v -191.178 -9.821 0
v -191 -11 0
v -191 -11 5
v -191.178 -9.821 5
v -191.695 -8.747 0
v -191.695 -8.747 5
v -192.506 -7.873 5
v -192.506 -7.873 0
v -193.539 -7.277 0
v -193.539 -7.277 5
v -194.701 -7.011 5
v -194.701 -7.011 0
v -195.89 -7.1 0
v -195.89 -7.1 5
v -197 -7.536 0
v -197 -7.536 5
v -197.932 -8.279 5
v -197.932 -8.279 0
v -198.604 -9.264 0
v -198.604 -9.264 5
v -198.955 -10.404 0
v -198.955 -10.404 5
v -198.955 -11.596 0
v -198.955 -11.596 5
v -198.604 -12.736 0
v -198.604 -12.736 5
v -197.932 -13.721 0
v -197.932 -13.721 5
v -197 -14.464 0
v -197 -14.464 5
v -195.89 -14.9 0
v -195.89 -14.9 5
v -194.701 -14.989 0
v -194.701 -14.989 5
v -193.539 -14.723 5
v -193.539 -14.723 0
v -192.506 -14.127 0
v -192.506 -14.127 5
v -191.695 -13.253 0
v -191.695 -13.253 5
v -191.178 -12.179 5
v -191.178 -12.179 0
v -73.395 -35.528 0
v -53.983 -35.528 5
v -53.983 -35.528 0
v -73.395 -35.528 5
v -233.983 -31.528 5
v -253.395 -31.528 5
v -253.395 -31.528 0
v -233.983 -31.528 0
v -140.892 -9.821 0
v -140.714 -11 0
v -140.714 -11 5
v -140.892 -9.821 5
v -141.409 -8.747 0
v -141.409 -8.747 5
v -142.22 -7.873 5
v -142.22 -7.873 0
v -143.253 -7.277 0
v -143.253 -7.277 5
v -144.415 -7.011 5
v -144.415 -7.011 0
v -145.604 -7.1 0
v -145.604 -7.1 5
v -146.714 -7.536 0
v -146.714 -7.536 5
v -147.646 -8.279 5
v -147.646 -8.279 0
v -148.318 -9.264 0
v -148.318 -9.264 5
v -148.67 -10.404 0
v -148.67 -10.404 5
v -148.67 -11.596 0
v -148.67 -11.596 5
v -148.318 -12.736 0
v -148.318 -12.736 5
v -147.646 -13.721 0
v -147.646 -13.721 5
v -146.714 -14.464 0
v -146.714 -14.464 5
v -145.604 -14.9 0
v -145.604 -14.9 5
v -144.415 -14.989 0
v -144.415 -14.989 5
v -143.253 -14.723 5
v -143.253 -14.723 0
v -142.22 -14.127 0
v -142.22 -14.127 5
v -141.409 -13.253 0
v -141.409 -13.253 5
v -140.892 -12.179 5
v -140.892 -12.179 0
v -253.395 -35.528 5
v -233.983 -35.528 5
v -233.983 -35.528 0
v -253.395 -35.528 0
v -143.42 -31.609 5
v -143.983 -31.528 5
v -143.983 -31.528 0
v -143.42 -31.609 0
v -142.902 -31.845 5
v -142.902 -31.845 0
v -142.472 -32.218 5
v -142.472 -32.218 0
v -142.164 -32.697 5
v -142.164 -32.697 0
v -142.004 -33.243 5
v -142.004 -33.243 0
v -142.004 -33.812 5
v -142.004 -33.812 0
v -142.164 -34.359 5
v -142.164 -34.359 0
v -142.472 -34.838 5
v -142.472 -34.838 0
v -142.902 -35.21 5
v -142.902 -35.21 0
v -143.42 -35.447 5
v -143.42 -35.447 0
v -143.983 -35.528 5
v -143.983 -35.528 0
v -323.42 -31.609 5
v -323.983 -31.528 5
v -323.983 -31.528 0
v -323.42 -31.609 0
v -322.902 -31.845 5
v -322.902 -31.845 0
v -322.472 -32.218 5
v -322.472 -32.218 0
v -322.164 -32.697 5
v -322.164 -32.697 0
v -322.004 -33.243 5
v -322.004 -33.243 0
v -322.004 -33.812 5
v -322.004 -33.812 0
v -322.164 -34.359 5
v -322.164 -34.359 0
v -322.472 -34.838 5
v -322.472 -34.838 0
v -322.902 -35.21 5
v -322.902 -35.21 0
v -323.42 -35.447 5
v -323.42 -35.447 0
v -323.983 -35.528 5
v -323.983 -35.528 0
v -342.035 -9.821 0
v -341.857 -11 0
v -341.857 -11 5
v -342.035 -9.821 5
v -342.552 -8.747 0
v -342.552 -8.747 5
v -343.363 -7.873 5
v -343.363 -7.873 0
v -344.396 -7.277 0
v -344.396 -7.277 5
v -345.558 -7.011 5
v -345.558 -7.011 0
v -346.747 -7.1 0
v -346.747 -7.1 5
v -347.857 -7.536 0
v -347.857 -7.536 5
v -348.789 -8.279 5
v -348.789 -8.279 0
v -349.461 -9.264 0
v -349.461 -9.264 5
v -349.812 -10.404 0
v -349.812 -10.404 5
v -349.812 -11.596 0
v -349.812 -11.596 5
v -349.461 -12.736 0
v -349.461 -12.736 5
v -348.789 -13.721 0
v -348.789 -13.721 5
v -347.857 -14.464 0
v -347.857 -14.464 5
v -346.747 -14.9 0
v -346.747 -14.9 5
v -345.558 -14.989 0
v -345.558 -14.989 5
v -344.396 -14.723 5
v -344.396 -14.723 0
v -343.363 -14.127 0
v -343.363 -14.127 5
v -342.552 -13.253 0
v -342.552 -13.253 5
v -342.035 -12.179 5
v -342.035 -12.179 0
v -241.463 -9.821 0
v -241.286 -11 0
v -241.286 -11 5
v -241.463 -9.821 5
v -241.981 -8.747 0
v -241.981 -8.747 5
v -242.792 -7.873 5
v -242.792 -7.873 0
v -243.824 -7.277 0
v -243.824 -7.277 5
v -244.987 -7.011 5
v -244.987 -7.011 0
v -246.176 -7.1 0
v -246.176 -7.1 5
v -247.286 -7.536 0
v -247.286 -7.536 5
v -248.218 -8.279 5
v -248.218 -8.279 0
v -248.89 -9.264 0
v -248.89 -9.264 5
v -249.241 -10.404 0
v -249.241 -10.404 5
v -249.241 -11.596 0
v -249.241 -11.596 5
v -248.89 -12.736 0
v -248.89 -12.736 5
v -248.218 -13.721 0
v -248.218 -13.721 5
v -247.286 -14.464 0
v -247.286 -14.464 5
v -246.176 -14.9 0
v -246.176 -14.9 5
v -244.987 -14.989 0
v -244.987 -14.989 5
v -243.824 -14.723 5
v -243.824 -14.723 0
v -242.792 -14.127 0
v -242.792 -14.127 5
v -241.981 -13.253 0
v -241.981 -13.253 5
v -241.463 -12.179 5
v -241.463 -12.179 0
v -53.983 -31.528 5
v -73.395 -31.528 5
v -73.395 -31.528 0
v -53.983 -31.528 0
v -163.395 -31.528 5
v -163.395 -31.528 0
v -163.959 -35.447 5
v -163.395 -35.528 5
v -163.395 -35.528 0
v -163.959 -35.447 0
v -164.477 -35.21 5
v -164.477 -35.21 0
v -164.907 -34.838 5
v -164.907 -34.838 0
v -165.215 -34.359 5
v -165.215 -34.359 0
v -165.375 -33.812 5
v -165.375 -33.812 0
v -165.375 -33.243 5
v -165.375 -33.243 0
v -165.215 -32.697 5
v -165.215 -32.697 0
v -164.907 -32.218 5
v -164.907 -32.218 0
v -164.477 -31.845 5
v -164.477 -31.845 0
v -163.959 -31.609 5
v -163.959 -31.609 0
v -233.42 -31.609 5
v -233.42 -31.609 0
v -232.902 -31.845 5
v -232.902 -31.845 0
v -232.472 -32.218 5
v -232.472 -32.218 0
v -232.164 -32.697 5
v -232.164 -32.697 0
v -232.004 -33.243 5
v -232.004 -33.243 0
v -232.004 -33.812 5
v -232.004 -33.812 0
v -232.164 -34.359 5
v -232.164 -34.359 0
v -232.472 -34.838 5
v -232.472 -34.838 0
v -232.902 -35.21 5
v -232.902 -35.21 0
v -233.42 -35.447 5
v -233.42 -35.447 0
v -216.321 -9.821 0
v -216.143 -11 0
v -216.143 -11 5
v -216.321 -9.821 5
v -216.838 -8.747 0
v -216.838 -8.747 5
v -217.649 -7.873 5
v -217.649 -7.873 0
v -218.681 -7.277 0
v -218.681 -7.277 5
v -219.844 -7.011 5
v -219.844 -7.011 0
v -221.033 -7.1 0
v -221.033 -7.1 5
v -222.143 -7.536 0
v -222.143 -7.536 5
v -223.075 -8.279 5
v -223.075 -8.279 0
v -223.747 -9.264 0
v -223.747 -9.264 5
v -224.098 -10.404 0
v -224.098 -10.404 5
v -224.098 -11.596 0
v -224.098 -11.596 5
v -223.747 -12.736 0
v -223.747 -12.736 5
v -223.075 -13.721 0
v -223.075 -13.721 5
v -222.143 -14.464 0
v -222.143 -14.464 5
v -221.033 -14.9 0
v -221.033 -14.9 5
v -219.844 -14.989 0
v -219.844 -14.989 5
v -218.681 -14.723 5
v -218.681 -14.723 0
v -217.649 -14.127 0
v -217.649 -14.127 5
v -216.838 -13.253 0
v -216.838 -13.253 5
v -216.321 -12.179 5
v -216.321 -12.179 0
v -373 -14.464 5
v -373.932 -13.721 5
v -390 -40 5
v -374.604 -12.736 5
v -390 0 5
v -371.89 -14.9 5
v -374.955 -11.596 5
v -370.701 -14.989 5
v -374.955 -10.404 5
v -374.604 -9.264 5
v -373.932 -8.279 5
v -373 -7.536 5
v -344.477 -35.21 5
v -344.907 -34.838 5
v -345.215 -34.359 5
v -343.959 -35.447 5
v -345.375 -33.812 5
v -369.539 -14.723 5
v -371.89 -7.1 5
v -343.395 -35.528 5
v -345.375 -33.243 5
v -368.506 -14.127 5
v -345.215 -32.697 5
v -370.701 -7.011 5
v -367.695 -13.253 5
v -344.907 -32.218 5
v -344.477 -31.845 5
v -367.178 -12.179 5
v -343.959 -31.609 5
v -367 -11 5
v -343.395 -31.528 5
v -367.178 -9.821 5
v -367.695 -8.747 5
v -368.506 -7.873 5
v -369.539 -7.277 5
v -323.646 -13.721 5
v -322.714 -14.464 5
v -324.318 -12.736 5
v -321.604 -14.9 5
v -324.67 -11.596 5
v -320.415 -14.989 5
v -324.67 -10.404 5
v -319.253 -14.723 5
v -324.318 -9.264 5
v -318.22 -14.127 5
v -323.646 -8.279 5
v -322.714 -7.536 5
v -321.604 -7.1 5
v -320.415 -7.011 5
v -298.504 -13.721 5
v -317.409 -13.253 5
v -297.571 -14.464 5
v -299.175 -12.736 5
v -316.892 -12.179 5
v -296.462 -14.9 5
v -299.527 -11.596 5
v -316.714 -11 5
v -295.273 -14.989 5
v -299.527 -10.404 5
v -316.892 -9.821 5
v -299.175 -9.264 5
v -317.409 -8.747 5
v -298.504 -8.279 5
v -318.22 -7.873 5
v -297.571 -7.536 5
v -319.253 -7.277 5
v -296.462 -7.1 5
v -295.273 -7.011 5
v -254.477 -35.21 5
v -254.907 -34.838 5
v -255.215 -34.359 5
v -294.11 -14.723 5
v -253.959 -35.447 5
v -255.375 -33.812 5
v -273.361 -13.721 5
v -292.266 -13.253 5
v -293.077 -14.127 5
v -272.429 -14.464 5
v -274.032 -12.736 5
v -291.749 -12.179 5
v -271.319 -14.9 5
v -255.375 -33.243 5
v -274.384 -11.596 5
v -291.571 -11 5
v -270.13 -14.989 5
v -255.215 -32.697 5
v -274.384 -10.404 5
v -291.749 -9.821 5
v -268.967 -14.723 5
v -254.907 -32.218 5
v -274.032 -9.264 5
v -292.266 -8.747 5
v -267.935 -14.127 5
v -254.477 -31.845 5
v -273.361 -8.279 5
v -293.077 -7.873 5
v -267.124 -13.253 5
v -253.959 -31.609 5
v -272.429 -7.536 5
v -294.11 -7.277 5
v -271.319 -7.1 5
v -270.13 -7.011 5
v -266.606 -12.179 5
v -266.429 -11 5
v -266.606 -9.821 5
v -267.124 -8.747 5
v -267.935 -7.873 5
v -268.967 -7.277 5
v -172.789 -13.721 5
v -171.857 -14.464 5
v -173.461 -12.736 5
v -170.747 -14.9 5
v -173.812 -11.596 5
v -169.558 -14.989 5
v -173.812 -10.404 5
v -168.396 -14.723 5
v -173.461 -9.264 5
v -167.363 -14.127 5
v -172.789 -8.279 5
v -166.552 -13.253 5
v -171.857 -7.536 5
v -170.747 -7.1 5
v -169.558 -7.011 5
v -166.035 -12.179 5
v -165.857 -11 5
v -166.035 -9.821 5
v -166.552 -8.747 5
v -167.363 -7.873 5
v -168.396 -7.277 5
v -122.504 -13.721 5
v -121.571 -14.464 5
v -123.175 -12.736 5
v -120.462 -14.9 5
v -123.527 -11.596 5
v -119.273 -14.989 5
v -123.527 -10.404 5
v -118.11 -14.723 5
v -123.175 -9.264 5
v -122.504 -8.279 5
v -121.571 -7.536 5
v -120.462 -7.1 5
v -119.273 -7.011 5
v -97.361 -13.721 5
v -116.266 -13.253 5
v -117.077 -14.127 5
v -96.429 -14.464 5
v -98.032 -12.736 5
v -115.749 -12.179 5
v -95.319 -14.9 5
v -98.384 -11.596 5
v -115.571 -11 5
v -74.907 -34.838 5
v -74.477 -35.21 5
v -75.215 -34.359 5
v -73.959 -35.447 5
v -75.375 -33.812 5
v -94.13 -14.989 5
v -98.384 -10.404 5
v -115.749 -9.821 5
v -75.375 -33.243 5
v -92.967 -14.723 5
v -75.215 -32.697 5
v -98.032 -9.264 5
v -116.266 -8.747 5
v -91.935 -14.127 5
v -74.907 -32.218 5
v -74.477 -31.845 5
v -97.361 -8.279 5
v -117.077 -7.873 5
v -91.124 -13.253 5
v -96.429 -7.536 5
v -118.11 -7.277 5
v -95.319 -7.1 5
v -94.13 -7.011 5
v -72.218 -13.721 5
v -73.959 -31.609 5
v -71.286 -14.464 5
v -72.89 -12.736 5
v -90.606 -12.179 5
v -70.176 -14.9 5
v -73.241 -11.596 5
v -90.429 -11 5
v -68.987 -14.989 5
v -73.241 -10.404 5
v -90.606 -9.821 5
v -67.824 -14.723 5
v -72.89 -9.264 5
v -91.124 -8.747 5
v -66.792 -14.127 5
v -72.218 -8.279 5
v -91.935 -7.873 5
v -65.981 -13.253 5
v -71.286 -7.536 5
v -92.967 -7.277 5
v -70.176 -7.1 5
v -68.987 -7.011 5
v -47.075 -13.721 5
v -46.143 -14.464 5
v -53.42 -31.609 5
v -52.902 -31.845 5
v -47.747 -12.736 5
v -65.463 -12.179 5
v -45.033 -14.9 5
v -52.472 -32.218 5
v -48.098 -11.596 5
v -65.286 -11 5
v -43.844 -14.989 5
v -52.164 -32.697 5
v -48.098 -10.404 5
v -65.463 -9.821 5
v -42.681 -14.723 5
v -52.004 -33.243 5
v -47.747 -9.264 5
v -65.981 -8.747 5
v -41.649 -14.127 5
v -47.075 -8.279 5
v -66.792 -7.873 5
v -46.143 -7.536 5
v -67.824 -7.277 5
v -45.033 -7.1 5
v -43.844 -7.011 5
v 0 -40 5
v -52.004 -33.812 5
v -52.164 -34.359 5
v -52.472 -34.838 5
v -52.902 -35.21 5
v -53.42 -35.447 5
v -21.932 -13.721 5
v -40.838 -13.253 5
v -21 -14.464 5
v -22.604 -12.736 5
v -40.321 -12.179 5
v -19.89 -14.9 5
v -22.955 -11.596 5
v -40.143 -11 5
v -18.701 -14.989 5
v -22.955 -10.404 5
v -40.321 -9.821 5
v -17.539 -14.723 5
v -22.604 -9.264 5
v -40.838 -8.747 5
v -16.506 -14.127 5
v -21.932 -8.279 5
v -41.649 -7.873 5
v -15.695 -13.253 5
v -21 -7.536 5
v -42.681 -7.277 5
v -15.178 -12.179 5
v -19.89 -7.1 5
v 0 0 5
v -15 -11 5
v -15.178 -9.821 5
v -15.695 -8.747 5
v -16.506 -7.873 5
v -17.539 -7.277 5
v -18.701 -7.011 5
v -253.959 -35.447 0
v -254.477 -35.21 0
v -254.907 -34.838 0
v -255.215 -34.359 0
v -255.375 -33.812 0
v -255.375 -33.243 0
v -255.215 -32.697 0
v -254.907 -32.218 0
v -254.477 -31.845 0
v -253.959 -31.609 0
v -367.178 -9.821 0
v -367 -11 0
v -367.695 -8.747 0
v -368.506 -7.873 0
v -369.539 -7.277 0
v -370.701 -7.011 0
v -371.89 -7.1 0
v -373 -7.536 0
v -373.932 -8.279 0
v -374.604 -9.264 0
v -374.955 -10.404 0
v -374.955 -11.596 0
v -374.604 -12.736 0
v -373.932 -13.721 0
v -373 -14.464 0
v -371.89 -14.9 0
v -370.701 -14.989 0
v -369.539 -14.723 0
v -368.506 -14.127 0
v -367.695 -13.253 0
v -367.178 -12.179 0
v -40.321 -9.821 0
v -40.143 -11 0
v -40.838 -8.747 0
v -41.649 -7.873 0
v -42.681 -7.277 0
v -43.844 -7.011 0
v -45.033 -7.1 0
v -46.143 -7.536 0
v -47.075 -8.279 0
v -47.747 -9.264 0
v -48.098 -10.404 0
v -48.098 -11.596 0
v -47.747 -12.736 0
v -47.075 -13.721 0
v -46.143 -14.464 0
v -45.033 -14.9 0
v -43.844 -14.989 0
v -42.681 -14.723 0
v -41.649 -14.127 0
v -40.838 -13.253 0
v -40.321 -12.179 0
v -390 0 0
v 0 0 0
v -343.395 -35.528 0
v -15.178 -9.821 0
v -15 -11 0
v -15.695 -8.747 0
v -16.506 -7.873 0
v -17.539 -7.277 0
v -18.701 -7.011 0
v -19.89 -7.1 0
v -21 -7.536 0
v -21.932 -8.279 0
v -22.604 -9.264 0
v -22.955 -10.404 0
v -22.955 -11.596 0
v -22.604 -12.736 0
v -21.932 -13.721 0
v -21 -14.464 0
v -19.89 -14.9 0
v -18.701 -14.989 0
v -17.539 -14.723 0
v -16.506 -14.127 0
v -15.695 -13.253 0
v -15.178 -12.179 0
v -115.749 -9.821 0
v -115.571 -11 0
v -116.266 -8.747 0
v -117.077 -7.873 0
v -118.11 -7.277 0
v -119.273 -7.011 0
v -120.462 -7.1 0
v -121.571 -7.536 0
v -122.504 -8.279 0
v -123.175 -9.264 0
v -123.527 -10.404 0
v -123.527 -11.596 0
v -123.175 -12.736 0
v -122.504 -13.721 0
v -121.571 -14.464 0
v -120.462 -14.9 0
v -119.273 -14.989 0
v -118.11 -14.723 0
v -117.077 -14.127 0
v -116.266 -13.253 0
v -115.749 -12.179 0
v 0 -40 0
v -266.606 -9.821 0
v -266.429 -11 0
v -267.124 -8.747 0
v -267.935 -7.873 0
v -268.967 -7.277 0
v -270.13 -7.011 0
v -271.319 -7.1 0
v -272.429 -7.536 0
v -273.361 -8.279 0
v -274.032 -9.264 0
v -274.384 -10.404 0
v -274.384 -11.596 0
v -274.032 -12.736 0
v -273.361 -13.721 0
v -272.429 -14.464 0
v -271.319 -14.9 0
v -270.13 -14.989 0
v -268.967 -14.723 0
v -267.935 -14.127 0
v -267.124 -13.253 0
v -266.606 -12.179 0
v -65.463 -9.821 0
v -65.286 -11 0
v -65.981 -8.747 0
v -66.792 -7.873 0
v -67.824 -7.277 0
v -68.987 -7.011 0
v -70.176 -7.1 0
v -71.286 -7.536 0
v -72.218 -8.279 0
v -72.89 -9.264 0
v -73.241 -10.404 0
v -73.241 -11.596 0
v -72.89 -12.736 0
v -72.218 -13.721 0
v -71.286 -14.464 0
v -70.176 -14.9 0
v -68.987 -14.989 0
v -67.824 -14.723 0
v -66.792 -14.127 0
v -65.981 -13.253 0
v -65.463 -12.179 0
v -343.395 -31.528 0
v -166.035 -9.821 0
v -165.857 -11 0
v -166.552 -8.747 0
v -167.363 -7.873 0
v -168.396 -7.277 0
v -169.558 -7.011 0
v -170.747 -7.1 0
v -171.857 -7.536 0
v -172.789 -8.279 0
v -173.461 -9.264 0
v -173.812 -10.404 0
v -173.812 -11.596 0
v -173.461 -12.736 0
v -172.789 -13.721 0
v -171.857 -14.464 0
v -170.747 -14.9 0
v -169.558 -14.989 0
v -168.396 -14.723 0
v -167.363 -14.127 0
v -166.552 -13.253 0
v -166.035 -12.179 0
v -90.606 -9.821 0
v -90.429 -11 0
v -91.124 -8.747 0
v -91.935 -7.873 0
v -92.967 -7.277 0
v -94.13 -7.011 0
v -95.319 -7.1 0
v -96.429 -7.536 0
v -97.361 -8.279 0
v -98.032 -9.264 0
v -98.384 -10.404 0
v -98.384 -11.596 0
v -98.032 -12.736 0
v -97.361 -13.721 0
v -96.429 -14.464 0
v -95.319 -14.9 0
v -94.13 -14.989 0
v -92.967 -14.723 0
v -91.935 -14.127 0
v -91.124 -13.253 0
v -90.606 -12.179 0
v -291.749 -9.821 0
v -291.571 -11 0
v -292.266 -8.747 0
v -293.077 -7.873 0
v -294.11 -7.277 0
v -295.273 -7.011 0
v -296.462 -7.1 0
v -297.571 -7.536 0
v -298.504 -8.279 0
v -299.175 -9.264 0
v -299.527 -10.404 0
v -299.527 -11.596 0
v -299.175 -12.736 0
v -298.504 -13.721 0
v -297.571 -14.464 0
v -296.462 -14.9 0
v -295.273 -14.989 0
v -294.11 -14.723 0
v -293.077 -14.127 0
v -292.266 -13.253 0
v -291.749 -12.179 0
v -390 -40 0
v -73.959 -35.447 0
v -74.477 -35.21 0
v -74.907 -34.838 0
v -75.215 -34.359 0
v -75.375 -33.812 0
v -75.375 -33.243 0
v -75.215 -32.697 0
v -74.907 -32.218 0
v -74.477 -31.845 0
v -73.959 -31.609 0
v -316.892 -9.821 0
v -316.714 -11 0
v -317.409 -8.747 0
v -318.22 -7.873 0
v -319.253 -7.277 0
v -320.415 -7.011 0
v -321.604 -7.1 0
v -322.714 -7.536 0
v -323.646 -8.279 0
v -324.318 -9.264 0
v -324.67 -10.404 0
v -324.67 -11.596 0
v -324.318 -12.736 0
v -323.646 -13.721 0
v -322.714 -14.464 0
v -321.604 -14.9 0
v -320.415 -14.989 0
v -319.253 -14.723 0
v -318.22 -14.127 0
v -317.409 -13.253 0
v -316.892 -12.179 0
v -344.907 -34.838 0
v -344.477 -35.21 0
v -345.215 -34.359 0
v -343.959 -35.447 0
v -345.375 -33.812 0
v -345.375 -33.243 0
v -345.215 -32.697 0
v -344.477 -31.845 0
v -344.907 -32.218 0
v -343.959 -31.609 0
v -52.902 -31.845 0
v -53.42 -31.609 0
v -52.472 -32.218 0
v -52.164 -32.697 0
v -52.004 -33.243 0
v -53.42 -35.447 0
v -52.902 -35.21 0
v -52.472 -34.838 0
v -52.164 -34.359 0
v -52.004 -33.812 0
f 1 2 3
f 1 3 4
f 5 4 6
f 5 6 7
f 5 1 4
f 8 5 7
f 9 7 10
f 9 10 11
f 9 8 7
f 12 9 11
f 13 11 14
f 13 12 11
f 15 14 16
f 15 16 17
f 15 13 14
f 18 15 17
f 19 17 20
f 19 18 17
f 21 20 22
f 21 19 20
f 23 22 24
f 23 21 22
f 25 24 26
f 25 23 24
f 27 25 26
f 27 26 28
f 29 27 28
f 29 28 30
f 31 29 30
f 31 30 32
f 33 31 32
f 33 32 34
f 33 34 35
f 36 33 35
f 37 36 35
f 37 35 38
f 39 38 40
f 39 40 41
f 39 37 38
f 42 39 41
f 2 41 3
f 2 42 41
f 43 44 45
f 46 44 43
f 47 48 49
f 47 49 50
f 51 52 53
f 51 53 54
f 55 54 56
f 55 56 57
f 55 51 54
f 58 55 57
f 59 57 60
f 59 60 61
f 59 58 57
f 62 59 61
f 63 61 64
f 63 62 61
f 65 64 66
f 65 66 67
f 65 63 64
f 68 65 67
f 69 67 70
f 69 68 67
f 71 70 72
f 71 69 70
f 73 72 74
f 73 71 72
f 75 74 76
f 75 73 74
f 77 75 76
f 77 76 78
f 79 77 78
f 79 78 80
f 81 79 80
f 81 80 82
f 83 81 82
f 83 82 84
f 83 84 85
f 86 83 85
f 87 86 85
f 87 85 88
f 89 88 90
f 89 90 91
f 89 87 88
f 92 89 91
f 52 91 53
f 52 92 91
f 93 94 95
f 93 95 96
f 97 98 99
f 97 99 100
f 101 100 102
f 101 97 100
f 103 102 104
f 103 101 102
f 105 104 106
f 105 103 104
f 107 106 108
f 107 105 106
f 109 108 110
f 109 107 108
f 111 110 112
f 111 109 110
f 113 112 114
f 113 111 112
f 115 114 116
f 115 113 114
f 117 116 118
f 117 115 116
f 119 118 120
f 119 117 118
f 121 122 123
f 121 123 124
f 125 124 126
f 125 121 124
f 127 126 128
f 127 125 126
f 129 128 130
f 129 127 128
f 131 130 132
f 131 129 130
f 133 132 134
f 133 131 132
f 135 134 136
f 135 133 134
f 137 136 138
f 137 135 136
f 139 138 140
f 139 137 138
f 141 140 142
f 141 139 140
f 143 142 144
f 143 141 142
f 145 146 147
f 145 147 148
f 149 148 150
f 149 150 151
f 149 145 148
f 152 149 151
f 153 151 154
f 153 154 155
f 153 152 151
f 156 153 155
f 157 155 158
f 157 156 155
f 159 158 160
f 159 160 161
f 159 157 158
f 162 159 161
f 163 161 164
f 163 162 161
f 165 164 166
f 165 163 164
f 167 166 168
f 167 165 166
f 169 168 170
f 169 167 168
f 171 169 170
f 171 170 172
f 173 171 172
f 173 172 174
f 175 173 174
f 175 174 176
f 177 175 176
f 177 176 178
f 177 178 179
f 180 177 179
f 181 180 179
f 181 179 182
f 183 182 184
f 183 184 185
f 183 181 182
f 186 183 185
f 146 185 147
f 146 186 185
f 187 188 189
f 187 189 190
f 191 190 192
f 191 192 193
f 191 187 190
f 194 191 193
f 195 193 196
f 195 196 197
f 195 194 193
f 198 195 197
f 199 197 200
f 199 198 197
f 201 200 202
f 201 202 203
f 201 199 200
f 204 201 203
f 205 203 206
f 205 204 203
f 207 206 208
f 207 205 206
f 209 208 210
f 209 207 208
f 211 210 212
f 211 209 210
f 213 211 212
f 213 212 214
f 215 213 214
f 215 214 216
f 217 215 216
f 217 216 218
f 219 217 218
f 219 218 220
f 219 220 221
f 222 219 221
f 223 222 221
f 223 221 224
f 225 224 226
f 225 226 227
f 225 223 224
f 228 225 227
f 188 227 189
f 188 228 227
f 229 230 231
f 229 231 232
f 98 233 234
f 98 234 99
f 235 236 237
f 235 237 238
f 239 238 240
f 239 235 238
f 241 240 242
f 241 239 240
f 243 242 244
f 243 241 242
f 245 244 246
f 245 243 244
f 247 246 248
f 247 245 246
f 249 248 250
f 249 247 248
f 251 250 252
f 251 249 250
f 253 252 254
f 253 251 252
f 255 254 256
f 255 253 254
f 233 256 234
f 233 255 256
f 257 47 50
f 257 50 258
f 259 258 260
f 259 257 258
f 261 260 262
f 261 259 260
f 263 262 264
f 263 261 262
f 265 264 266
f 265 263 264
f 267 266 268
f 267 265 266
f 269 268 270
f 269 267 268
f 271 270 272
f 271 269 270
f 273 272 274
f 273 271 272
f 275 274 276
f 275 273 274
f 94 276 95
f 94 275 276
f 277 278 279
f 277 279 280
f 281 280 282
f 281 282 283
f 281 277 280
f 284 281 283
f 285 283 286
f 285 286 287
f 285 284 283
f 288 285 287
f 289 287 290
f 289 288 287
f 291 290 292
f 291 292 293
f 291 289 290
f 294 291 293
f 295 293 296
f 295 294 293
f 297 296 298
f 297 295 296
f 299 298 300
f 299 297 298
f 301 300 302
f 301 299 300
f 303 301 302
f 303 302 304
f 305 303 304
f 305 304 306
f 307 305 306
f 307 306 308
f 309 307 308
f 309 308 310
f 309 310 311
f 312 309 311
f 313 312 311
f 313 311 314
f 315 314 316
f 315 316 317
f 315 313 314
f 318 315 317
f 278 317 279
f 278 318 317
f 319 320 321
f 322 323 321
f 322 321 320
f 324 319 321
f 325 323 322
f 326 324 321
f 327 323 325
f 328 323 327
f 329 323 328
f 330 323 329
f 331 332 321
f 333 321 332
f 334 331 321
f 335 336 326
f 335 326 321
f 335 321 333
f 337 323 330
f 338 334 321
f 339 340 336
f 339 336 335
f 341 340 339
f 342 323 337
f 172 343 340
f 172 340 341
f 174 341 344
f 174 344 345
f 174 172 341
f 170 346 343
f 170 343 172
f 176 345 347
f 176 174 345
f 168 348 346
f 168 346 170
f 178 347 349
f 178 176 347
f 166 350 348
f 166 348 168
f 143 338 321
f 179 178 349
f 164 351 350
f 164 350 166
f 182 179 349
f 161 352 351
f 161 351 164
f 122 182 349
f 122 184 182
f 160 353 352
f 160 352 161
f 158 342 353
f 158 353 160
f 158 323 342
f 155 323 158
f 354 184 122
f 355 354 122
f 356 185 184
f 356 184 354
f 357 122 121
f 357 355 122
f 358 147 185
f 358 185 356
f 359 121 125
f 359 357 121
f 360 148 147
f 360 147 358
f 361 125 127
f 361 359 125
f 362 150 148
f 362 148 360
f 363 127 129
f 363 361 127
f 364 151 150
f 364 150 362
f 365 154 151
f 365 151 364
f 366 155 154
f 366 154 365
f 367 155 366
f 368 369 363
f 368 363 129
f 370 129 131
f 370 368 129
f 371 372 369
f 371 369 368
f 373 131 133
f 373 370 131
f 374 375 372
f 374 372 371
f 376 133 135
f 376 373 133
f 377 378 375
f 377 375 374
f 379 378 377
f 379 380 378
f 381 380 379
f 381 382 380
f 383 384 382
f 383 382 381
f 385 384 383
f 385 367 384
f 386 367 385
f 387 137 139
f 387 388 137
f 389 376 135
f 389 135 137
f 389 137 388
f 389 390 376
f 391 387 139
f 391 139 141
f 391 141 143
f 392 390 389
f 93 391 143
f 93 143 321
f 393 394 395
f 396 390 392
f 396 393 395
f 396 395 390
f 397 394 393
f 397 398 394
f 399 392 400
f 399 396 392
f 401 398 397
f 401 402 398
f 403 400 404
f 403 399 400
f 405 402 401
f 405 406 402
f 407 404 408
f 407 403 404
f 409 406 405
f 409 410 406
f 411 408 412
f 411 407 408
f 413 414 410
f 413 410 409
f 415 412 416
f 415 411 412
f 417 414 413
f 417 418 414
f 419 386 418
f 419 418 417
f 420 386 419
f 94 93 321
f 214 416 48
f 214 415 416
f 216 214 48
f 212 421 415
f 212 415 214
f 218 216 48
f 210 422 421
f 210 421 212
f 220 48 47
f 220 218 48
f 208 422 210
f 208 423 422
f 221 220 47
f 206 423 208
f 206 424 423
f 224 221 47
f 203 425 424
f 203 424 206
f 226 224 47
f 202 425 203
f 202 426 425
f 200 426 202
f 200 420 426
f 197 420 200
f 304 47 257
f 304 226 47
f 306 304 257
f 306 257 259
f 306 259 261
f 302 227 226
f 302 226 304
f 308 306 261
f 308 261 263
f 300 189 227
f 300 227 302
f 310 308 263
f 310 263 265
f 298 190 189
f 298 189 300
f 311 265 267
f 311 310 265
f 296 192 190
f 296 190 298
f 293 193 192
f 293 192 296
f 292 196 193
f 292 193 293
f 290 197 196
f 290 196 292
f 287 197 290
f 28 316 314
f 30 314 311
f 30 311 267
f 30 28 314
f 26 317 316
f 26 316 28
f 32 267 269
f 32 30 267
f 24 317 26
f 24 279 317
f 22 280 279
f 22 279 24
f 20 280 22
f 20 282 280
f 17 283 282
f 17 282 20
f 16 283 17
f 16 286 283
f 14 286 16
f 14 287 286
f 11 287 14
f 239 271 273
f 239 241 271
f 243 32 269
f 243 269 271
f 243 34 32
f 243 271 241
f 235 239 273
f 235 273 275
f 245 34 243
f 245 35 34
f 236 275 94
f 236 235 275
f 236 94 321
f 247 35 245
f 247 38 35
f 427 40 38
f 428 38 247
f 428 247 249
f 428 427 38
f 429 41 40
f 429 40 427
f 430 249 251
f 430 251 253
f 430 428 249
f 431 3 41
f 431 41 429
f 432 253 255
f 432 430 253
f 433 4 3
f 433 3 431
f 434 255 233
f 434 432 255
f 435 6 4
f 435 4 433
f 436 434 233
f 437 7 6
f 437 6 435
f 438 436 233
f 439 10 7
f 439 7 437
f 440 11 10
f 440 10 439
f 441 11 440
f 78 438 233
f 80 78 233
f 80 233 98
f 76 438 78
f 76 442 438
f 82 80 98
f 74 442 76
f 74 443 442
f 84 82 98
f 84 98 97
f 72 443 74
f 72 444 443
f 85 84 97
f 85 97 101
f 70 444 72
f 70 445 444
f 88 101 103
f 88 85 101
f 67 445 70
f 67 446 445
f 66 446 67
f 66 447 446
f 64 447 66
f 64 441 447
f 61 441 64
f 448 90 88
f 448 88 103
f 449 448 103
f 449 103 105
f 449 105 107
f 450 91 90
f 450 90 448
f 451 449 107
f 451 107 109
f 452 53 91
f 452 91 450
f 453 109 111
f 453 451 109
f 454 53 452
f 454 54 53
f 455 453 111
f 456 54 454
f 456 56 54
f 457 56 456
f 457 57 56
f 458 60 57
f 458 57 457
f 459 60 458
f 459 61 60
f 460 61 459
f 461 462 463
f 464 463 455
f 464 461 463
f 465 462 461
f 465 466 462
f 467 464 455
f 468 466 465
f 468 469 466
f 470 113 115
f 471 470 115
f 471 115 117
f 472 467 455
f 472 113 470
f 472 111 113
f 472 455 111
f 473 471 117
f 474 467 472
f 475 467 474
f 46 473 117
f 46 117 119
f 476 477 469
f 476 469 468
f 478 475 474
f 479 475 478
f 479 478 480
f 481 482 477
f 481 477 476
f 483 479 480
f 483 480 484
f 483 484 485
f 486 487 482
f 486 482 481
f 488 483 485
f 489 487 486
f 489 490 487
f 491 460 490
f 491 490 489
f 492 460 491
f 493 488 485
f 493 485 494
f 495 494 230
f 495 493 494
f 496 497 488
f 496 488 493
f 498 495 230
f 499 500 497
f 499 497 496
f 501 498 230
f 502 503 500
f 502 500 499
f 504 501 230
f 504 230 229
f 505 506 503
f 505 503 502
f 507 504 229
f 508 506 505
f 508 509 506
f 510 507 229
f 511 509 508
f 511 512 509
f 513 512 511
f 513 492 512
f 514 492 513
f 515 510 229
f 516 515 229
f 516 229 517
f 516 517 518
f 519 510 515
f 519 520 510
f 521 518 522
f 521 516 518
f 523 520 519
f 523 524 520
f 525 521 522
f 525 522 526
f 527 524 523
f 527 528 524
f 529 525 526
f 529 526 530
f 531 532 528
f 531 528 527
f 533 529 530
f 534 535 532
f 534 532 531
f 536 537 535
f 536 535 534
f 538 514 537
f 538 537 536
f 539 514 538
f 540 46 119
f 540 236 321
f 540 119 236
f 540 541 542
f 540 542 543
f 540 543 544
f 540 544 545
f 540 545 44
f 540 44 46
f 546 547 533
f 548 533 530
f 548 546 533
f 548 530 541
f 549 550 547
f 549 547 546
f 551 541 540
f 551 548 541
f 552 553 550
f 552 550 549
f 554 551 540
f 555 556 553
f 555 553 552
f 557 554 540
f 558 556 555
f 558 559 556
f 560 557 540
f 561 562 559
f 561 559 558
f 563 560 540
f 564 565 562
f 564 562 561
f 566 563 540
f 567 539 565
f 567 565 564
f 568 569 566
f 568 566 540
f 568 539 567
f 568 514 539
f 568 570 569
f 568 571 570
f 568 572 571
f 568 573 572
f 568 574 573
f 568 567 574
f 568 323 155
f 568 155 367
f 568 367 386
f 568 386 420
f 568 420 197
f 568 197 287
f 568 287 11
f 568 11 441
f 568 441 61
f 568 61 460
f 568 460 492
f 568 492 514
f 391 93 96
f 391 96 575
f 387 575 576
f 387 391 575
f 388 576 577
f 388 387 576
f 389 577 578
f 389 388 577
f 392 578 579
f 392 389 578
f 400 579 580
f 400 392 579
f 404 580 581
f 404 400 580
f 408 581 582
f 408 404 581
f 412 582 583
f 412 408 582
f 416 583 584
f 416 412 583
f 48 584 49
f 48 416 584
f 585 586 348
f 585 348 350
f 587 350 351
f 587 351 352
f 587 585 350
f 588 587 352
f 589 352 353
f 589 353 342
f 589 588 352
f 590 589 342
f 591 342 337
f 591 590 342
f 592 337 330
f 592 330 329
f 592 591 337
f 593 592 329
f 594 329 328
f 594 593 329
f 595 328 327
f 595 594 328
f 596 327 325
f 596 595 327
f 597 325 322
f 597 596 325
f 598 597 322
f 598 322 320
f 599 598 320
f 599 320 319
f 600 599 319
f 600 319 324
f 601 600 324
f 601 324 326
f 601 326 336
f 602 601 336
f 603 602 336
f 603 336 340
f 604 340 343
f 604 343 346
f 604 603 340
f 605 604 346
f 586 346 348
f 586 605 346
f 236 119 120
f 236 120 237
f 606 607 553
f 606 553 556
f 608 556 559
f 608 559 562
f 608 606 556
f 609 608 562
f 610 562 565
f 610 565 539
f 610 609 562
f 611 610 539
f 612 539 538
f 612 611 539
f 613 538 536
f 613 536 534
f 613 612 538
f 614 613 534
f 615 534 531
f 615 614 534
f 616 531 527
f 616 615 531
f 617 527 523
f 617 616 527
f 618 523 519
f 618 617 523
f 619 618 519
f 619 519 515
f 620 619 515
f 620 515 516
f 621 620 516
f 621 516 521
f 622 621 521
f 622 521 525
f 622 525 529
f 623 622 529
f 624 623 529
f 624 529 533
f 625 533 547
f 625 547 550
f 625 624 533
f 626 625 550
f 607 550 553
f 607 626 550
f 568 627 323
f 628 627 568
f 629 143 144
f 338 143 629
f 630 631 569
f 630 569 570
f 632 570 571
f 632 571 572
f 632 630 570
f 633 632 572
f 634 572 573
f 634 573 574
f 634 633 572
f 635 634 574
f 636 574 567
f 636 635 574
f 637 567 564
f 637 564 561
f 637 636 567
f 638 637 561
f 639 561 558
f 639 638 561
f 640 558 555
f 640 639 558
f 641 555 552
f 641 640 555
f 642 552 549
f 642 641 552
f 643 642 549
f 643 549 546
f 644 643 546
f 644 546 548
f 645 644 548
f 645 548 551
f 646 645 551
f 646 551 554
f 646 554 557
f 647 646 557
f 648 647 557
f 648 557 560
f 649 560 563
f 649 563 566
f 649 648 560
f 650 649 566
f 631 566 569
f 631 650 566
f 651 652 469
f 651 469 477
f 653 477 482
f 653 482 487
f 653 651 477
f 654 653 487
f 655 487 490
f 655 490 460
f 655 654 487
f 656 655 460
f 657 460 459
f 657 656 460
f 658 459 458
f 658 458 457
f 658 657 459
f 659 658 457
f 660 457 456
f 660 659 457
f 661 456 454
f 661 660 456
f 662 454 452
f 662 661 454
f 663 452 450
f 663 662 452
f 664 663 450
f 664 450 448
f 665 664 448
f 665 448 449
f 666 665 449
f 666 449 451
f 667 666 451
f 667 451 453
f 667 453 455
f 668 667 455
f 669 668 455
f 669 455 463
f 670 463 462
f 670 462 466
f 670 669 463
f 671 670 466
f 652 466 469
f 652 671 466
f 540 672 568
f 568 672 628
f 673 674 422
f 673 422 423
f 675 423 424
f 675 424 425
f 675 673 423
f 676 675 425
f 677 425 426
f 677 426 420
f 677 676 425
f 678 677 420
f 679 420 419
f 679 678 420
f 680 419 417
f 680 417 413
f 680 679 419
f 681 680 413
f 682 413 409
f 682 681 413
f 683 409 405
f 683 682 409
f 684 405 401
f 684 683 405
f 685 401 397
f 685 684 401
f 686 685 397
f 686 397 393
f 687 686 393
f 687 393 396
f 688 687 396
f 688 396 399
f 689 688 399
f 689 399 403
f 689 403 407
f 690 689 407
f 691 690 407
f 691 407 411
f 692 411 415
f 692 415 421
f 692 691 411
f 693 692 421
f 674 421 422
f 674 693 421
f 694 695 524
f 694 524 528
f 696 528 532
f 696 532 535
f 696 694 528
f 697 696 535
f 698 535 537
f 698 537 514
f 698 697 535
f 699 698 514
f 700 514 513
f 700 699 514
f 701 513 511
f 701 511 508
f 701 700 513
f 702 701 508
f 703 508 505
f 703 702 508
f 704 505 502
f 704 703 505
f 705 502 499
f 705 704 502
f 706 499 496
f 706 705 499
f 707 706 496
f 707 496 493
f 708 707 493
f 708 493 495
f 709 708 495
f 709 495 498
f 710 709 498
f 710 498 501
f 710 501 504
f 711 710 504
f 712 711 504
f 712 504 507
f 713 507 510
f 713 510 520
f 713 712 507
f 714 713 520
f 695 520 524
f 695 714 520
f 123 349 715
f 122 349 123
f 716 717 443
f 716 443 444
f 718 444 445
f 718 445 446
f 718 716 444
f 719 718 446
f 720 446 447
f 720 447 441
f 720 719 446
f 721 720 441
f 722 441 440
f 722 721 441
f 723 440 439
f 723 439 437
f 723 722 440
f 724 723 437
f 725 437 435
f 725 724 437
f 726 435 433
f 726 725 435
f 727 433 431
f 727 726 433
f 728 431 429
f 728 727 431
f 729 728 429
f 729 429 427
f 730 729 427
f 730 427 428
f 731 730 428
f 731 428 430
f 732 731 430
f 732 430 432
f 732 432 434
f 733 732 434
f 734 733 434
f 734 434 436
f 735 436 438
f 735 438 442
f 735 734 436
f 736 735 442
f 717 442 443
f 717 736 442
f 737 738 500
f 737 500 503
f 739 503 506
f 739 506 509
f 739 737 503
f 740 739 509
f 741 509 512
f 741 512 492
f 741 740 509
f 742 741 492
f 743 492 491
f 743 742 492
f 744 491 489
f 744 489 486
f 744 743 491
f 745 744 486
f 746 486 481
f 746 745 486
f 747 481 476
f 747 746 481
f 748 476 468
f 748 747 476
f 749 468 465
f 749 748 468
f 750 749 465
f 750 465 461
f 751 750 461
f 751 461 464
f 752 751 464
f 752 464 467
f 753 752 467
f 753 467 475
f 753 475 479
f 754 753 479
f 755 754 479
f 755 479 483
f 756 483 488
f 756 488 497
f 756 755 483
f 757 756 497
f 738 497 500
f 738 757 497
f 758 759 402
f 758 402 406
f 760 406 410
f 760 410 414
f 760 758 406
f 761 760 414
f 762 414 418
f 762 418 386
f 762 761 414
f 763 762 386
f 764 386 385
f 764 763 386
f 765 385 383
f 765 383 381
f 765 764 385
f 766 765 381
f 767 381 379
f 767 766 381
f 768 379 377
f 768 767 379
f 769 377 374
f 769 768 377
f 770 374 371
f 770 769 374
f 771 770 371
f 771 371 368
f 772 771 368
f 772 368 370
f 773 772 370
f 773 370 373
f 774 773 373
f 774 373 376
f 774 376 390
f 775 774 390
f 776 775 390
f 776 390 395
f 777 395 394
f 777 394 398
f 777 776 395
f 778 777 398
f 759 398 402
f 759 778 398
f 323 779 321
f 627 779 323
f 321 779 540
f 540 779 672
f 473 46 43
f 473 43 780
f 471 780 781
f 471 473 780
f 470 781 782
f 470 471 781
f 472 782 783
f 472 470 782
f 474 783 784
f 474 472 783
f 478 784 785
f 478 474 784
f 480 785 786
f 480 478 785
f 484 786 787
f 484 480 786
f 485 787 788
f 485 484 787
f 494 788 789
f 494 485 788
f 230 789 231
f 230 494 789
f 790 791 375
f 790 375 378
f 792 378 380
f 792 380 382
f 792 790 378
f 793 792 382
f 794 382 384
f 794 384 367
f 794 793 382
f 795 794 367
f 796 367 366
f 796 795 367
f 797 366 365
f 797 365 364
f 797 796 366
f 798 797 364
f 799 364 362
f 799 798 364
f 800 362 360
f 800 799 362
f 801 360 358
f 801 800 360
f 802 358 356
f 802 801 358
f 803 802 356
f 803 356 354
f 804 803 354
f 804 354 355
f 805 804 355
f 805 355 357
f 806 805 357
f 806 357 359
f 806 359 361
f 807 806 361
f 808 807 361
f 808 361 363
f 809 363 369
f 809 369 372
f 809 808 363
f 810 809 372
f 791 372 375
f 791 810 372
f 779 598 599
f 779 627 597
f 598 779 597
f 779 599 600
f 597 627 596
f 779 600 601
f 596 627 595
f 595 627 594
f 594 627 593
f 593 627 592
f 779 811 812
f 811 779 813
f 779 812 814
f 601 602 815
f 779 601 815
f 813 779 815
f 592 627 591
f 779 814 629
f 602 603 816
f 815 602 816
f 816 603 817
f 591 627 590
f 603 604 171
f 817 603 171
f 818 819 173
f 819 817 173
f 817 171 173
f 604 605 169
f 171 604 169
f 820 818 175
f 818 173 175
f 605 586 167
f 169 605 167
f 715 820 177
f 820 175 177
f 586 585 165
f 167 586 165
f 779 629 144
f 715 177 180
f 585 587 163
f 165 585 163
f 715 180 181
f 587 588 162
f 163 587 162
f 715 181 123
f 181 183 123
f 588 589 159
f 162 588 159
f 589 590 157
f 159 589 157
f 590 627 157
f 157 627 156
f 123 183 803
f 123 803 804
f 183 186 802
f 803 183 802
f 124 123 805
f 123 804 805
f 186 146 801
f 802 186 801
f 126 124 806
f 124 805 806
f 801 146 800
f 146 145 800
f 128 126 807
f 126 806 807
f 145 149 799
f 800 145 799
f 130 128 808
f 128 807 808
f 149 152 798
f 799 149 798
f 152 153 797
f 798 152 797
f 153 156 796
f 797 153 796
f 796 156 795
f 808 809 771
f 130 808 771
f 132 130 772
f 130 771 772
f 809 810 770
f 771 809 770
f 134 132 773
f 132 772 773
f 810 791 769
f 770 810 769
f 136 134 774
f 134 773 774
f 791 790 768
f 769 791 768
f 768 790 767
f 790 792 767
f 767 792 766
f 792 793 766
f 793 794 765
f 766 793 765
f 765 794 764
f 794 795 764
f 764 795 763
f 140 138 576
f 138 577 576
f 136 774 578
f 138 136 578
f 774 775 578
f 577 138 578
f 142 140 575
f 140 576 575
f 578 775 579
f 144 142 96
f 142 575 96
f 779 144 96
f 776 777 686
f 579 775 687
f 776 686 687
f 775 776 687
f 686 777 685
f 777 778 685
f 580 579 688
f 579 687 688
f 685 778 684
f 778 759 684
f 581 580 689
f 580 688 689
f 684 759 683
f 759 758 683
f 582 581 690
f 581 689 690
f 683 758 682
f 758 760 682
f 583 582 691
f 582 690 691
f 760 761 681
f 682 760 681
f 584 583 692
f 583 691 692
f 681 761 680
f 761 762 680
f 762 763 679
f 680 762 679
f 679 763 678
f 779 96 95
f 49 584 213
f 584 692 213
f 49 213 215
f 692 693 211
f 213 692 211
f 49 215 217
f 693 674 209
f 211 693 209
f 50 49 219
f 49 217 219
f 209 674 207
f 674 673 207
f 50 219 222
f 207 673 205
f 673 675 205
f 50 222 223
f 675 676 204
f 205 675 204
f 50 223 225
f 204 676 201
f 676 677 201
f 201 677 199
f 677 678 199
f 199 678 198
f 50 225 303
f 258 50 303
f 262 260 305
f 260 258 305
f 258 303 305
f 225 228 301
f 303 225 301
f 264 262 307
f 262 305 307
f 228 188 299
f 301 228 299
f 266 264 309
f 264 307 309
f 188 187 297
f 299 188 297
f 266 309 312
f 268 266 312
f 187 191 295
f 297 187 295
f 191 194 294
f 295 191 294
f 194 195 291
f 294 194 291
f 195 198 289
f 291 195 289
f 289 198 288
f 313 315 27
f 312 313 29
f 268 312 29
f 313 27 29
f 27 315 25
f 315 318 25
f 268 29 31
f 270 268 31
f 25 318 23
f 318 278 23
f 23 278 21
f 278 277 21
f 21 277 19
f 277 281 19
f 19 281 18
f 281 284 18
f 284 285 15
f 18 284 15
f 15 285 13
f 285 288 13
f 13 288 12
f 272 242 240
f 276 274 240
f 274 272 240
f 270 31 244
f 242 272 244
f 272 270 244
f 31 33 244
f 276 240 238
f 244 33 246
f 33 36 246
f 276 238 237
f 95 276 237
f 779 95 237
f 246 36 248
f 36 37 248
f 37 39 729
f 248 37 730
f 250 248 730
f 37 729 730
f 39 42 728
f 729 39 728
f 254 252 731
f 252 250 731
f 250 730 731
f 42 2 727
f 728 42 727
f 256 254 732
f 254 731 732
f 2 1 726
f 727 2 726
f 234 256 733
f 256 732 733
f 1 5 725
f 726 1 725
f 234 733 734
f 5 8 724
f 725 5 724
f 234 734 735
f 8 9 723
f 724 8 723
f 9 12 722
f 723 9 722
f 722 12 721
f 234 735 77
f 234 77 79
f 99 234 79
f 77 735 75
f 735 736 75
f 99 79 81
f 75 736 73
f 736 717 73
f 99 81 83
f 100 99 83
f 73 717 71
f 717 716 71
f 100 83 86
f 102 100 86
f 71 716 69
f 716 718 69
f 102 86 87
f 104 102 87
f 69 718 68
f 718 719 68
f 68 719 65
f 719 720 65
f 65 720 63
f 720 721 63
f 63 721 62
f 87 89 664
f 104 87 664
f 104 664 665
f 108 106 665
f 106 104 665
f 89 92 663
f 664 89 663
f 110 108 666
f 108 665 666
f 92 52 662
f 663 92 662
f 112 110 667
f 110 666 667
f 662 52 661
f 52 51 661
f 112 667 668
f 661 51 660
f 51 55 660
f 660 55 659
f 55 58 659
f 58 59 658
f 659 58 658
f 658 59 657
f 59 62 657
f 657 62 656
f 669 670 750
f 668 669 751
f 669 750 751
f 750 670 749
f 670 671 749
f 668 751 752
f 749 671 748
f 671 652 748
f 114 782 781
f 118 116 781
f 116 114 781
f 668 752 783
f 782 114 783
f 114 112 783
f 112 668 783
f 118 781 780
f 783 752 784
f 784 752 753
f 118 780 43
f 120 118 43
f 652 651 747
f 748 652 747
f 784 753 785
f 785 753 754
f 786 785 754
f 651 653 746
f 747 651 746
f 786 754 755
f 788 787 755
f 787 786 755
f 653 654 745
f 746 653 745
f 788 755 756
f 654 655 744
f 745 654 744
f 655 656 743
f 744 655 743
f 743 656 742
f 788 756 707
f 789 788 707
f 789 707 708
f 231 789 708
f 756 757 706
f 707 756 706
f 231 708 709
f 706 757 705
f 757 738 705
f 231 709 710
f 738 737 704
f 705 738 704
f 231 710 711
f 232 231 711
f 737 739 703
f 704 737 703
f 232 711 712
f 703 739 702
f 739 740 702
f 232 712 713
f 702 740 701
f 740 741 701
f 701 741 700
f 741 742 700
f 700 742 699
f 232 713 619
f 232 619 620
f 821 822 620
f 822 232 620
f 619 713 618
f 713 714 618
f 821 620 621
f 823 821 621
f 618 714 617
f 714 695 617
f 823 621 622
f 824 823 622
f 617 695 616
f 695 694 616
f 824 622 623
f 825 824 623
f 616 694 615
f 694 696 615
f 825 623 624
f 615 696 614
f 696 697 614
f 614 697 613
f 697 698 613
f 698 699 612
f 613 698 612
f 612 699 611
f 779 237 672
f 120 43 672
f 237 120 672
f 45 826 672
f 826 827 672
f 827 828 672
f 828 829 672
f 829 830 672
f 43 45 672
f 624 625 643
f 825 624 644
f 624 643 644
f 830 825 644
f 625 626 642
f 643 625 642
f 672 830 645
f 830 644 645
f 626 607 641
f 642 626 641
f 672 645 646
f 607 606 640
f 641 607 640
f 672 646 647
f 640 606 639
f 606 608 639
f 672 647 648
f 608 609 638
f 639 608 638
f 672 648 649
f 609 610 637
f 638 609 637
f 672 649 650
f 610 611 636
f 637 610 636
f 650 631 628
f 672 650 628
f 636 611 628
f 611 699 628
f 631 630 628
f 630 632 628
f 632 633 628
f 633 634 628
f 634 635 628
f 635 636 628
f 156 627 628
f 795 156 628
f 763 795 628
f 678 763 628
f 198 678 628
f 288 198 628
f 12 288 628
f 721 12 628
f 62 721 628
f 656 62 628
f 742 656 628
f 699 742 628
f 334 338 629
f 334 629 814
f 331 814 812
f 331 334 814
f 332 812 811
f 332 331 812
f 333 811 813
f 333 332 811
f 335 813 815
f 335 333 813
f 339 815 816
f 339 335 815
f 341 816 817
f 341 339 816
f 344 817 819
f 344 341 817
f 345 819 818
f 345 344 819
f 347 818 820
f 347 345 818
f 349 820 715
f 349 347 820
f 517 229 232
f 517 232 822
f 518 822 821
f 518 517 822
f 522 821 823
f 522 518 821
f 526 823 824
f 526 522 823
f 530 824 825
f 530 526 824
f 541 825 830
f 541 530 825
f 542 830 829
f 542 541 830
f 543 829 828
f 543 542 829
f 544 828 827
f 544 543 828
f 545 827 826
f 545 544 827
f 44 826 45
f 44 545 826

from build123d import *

# Parameters (mm, degrees)
IZIM1_W                     = 390
IZIM1_H                     = 40
IZIM1_R                     = 4
Y_KSEKLIK_EKSTR_ZYON1_DEPTH = 5
KES_EKSTR_ZYON1_DEPTH       = 90


with BuildPart() as part:
    # Çizim1 → Yükseklik-Ekstrüzyon1 (new body)
    with BuildSketch(Plane.XY):
        with Locations((-195, -20)):
            Rectangle(IZIM1_W, IZIM1_H)
        with Locations((-371, -11)):
            Circle(IZIM1_R, mode=Mode.SUBTRACT)
        with Locations((-345.857142857, -11)):
            Circle(IZIM1_R, mode=Mode.SUBTRACT)
        with Locations((-320.714285714, -11)):
            Circle(IZIM1_R, mode=Mode.SUBTRACT)
        with Locations((-295.571428571, -11)):
            Circle(IZIM1_R, mode=Mode.SUBTRACT)
        with Locations((-270.428571429, -11)):
            Circle(IZIM1_R, mode=Mode.SUBTRACT)
        with Locations((-245.285714286, -11)):
            Circle(IZIM1_R, mode=Mode.SUBTRACT)
        with Locations((-220.142857143, -11)):
            Circle(IZIM1_R, mode=Mode.SUBTRACT)
        with Locations((-195, -11)):
            Circle(IZIM1_R, mode=Mode.SUBTRACT)
        with Locations((-169.857142857, -11)):
            Circle(IZIM1_R, mode=Mode.SUBTRACT)
        with Locations((-144.714285714, -11)):
            Circle(IZIM1_R, mode=Mode.SUBTRACT)
        with Locations((-119.571428571, -11)):
            Circle(IZIM1_R, mode=Mode.SUBTRACT)
        with Locations((-94.428571429, -11)):
            Circle(IZIM1_R, mode=Mode.SUBTRACT)
        with Locations((-69.285714286, -11)):
            Circle(IZIM1_R, mode=Mode.SUBTRACT)
        with Locations((-44.142857143, -11)):
            Circle(IZIM1_R, mode=Mode.SUBTRACT)
        with Locations((-19, -11)):
            Circle(IZIM1_R, mode=Mode.SUBTRACT)
    extrude(amount=Y_KSEKLIK_EKSTR_ZYON1_DEPTH)

    # Çizim2 → Kes-Ekstrüzyon1 (cut)
    with BuildSketch(Plane.XY.offset(5)):
        with BuildLine():
            Line((-343.395447279, -31.527866379), (-323.983252141, -31.527866379))
            ThreePointArc((-323.983252141, -31.527866379), (-321.983252141, -33.527866379), (-323.983252141, -35.527866379))
            Line((-323.983252141, -35.527866379), (-343.395447279, -35.527866379))
            ThreePointArc((-343.395447279, -35.527866379), (-345.395447279, -33.527866379), (-343.395447279, -31.527866379))
        make_face()
        with BuildLine():
            Line((-253.395447279, -31.527866379), (-233.983252141, -31.527866379))
            ThreePointArc((-233.983252141, -31.527866379), (-231.983252141, -33.527866379), (-233.983252141, -35.527866379))
            Line((-233.983252141, -35.527866379), (-253.395447279, -35.527866379))
            ThreePointArc((-253.395447279, -35.527866379), (-255.395447279, -33.527866379), (-253.395447279, -31.527866379))
        make_face()
        with BuildLine():
            Line((-163.395447279, -31.527866379), (-143.983252141, -31.527866379))
            ThreePointArc((-143.983252141, -31.527866379), (-141.983252141, -33.527866379), (-143.983252141, -35.527866379))
            Line((-143.983252141, -35.527866379), (-163.395447279, -35.527866379))
            ThreePointArc((-163.395447279, -35.527866379), (-165.395447279, -33.527866379), (-163.395447279, -31.527866379))
        make_face()
        with BuildLine():
            Line((-73.395447279, -31.527866379), (-53.983252141, -31.527866379))
            ThreePointArc((-53.983252141, -31.527866379), (-51.983252141, -33.527866379), (-53.983252141, -35.527866379))
            Line((-53.983252141, -35.527866379), (-73.395447279, -35.527866379))
            ThreePointArc((-73.395447279, -35.527866379), (-75.395447279, -33.527866379), (-73.395447279, -31.527866379))
        make_face()
    extrude(amount=-KES_EKSTR_ZYON1_DEPTH, mode=Mode.SUBTRACT)


solid = part.part
